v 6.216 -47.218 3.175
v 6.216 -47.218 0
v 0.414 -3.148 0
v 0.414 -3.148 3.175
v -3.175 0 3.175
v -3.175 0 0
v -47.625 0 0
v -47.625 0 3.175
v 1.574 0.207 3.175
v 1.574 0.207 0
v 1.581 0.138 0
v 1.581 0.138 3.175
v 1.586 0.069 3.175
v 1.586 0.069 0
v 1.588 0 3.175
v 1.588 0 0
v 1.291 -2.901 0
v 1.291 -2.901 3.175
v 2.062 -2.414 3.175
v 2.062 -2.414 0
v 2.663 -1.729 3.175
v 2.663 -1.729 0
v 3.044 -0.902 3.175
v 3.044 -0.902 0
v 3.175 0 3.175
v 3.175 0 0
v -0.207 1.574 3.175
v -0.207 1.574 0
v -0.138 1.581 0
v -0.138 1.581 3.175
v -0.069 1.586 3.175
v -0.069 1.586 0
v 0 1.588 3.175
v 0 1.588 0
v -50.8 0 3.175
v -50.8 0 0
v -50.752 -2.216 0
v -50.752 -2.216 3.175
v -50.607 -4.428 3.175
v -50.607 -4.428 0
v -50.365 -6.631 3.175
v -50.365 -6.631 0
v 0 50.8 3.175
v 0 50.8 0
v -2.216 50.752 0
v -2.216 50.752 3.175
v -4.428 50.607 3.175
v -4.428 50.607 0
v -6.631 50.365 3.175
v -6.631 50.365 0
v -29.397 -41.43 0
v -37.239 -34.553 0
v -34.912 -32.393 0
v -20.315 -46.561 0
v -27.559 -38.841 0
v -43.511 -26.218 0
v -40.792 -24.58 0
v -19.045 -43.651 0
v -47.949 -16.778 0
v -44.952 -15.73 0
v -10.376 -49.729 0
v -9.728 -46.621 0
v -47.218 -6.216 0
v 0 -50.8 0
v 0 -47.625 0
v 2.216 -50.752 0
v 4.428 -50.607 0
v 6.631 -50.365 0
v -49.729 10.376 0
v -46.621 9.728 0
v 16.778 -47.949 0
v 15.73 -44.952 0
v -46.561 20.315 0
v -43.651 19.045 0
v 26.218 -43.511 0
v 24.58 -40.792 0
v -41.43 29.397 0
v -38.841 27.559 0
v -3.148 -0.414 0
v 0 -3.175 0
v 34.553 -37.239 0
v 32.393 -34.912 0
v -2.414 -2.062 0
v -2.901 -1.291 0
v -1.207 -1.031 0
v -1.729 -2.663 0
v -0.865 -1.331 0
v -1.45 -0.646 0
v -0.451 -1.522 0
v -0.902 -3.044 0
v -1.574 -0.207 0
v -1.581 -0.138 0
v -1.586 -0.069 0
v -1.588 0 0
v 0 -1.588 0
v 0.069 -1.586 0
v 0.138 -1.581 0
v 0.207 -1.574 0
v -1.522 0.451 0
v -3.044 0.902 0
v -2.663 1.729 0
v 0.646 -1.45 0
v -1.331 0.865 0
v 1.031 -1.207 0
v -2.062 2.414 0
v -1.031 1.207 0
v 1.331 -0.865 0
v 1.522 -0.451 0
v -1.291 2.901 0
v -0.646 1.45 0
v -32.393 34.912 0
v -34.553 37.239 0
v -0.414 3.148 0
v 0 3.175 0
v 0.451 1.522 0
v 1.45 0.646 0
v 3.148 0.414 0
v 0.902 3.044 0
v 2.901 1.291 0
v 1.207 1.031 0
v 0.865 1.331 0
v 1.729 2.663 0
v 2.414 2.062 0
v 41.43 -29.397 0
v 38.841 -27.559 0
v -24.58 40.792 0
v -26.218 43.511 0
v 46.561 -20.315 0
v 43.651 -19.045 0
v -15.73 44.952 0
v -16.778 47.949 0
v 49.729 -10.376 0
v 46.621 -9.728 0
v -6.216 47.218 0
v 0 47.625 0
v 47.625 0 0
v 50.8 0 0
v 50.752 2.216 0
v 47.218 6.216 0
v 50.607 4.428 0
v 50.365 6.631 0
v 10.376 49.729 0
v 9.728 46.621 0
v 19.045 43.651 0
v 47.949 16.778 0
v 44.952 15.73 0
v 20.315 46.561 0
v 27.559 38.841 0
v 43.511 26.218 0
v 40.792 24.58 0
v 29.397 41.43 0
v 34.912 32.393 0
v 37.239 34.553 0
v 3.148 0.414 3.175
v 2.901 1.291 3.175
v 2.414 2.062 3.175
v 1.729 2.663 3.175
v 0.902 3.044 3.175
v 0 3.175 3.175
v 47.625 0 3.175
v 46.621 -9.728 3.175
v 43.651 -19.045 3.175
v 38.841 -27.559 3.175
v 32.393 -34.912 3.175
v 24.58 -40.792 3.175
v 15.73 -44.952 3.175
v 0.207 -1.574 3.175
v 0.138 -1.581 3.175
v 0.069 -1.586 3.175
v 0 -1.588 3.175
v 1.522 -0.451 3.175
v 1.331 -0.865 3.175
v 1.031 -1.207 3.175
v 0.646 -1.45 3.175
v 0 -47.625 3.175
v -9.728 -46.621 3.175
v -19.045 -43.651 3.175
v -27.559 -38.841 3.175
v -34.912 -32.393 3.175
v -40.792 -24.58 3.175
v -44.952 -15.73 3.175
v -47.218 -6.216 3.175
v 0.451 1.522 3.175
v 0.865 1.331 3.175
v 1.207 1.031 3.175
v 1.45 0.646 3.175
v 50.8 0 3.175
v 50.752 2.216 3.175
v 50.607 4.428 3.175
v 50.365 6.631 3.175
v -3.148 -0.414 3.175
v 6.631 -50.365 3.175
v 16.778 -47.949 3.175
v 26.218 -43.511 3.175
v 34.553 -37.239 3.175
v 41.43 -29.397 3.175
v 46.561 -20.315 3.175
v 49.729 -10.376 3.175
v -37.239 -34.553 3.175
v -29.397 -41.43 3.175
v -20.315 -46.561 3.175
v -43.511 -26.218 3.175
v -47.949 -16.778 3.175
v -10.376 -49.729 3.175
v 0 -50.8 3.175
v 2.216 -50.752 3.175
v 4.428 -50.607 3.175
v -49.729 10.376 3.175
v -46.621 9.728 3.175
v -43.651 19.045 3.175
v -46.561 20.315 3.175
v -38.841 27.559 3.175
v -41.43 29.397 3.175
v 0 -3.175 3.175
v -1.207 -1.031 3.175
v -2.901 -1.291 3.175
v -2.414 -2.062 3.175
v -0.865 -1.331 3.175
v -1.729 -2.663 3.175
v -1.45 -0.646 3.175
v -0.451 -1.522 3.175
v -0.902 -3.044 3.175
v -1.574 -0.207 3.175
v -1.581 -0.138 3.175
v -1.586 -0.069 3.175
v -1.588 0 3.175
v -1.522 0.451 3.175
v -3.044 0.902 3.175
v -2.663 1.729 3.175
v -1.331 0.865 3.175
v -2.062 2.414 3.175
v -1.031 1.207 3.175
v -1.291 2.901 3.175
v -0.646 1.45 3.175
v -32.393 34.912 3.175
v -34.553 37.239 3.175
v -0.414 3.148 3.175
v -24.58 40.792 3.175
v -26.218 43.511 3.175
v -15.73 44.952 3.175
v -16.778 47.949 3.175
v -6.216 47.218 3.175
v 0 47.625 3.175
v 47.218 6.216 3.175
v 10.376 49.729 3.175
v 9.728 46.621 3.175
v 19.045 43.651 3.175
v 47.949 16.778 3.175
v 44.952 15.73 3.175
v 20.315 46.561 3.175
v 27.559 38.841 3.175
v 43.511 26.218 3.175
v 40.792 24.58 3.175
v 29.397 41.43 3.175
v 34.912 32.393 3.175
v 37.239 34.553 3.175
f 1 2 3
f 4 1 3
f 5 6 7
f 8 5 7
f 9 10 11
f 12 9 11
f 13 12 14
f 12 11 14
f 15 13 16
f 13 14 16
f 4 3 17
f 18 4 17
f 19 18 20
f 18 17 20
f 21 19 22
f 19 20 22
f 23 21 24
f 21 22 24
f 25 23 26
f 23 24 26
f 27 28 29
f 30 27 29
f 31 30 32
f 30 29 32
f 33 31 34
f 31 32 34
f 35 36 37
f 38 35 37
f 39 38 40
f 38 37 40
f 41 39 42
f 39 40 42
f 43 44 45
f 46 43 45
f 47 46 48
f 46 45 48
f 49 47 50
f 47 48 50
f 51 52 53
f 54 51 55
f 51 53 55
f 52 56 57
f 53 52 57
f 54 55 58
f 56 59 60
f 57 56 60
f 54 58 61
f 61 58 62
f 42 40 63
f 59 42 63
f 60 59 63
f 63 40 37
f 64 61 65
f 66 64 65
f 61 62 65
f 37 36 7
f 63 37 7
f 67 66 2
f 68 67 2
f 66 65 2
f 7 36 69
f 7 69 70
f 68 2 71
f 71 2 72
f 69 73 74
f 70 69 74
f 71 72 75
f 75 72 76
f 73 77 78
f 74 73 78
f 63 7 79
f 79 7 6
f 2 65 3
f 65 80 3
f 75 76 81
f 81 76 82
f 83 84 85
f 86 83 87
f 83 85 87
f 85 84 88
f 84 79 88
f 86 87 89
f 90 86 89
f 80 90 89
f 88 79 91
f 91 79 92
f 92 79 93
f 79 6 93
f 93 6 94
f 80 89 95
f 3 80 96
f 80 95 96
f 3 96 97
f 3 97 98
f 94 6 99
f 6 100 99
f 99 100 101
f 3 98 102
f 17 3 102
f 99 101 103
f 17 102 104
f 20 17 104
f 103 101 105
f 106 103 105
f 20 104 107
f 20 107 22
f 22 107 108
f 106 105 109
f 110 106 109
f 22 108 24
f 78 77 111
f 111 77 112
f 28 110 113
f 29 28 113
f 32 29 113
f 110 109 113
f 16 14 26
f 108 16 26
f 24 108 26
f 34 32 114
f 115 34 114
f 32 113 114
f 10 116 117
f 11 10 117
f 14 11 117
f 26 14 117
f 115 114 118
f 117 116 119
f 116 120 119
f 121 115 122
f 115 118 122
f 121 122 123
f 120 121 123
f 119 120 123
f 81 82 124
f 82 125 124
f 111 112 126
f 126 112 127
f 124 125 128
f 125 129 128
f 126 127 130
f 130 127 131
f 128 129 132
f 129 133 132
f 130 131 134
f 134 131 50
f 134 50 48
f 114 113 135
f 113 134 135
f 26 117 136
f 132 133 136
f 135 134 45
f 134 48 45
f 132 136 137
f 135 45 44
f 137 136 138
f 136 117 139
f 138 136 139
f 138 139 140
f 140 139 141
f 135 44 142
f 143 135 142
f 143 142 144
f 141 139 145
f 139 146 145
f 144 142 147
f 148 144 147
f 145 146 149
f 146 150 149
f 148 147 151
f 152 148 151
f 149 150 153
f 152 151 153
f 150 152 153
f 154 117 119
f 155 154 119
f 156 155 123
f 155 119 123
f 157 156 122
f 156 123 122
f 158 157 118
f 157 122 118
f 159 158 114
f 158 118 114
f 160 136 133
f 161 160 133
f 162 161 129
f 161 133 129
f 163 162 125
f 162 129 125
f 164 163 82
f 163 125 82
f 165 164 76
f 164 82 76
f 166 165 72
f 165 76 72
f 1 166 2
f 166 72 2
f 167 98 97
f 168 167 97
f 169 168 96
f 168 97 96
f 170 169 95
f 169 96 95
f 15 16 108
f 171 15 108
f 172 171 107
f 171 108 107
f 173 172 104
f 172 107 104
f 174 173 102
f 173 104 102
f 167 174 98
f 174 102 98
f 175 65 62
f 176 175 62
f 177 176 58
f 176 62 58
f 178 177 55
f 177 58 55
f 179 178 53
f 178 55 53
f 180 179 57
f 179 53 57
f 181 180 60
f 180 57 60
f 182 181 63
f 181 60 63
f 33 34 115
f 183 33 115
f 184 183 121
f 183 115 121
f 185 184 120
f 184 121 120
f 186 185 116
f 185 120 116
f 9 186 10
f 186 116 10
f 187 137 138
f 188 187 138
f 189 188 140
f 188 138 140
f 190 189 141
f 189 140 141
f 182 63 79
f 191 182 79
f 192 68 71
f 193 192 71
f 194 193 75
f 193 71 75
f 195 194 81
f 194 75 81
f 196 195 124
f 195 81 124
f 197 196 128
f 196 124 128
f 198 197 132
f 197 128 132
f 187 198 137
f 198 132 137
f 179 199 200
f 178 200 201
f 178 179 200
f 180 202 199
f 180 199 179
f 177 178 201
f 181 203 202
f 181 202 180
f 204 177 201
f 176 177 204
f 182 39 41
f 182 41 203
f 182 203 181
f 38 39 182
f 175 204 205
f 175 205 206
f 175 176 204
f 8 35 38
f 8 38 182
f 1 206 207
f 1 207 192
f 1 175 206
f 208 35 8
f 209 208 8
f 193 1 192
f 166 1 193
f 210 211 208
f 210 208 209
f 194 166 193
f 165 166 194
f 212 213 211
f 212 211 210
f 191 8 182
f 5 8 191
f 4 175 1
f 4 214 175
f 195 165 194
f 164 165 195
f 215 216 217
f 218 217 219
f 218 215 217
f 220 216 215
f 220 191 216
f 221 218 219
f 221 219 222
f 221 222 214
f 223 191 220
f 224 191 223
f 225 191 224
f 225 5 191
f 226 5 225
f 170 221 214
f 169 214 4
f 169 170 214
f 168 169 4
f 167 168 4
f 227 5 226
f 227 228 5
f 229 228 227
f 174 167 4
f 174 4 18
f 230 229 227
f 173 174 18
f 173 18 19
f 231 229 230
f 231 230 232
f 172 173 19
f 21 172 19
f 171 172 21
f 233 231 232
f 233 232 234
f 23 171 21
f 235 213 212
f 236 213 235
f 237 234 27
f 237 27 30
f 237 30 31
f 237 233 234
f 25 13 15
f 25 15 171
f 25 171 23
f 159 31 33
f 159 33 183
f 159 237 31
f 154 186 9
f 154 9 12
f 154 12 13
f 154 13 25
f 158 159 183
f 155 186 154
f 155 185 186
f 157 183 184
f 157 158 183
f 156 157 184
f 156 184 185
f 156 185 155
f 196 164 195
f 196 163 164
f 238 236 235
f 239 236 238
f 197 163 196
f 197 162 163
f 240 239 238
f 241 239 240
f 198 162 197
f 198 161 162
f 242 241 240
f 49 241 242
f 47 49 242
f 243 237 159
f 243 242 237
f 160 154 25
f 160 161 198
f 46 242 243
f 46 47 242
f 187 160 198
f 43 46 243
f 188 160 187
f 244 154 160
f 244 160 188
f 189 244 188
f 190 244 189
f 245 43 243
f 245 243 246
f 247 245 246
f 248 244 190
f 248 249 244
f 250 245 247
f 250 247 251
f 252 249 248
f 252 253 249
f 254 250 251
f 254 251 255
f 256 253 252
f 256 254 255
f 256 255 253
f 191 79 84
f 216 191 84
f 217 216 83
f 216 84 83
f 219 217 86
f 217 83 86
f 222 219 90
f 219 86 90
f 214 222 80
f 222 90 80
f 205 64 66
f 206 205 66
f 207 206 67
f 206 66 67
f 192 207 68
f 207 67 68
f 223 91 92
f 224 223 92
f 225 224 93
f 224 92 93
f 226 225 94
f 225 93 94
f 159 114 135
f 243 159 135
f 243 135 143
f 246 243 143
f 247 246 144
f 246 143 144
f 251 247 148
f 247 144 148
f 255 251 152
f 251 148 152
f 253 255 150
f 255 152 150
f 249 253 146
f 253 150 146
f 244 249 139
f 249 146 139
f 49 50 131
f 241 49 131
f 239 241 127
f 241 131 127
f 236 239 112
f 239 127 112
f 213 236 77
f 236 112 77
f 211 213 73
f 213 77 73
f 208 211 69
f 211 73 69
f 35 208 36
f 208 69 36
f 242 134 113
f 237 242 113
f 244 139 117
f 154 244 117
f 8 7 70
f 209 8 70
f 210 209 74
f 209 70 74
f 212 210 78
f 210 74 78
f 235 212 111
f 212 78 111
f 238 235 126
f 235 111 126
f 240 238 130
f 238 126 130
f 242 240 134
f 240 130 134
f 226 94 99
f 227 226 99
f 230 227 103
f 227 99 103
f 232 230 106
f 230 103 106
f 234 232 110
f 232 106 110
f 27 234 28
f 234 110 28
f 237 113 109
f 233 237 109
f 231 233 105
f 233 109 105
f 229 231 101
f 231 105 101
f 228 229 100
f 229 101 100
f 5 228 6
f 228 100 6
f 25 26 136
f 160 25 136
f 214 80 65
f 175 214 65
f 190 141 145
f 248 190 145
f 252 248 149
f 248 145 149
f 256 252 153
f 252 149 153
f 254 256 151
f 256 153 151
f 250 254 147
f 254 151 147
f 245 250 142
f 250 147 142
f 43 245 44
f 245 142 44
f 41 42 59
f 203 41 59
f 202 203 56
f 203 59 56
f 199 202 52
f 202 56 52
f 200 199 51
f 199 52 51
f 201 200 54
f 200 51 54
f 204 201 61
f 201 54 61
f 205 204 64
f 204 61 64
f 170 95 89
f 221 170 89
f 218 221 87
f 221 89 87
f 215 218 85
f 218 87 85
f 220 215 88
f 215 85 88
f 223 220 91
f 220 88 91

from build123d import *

# Parameters (mm, degrees)
F1_DEPTH = 3.175


with BuildPart() as f1:
    # F0 (on Top) → F1 (new body)
    with BuildSketch(Plane.XY):
        with BuildLine():
            Line((-50.8, 0), (-47.625, 0))
            ThreePointArc((-47.625, 0), (-35.8063708312, 31.4013444441), (-6.2163099045, 47.2175615229))
            Line((-6.2163099045, 47.2175615229), (-6.6307305648, 50.3653989578))
            ThreePointArc((-6.6307305648, 50.3653989578), (-38.1934622199, 33.4947674071), (-50.8, 0))
        make_face()
        with BuildLine():
            ThreePointArc((-47.2175615229, -6.2163099045), (-47.5230312192, -3.1148240296), (-47.625, 0))
            Line((-47.625, 0), (-50.8, 0))
            ThreePointArc((-50.8, 0), (-50.6912333005, -3.3224789649), (-50.3653989578, -6.6307305648))
            Line((-50.3653989578, -6.6307305648), (-47.2175615229, -6.2163099045))
        make_face()
        with BuildLine():
            Line((0, -50.8), (0, -47.625))
            ThreePointArc((0, -47.625), (-31.4013444441, -35.8063708312), (-47.2175615229, -6.2163099045))
            Line((-47.2175615229, -6.2163099045), (-50.3653989578, -6.6307305648))
            ThreePointArc((-50.3653989578, -6.6307305648), (-33.4947674071, -38.1934622199), (0, -50.8))
        make_face()
        with BuildLine():
            Line((50.8, 0), (47.625, 0))
            ThreePointArc((47.625, 0), (35.8063708312, -31.4013444441), (6.2163099045, -47.2175615229))
            Line((6.2163099045, -47.2175615229), (6.6307305648, -50.3653989578))
            ThreePointArc((6.6307305648, -50.3653989578), (38.1934622199, -33.4947674071), (50.8, 0))
        make_face()
        with BuildLine():
            ThreePointArc((0, 47.625), (31.4013444441, 35.8063708312), (47.2175615229, 6.2163099045))
            Line((47.2175615229, 6.2163099045), (50.3653989578, 6.6307305648))
            ThreePointArc((50.3653989578, 6.6307305648), (33.4947674071, 38.1934622199), (0, 50.8))
            Line((0, 50.8), (0, 47.625))
        make_face()
        with BuildLine():
            ThreePointArc((-6.2163099045, 47.2175615229), (-3.1148240296, 47.5230312192), (0, 47.625))
            Line((0, 47.625), (0, 50.8))
            ThreePointArc((0, 50.8), (-3.3224789649, 50.6912333005), (-6.6307305648, 50.3653989578))
            Line((-6.6307305648, 50.3653989578), (-6.2163099045, 47.2175615229))
        make_face()
        with BuildLine():
            ThreePointArc((47.2175615229, 6.2163099045), (47.5230312192, 3.1148240296), (47.625, 0))
            Line((47.625, 0), (50.8, 0))
            ThreePointArc((50.8, 0), (50.6912333005, 3.3224789649), (50.3653989578, 6.6307305648))
            Line((50.3653989578, 6.6307305648), (47.2175615229, 6.2163099045))
        make_face()
        with BuildLine():
            Line((6.6307305648, -50.3653989578), (6.2163099045, -47.2175615229))
            ThreePointArc((6.2163099045, -47.2175615229), (3.1148240296, -47.5230312192), (0, -47.625))
            Line((0, -47.625), (0, -50.8))
            ThreePointArc((0, -50.8), (3.3224789649, -50.6912333005), (6.6307305648, -50.3653989578))
        make_face()
        with BuildLine():
            Line((-3.175, 0), (-1.5875, 0))
            ThreePointArc((-1.5875, 0), (-1.1935456944, 1.0467114815), (-0.2072103301, 1.5739187174))
            Line((-0.2072103301, 1.5739187174), (-0.4144206603, 3.1478374349))
            ThreePointArc((-0.4144206603, 3.1478374349), (-2.3870913887, 2.0934229629), (-3.175, 0))
        make_face()
        with BuildLine():
            ThreePointArc((-1.5739187174, -0.2072103301), (-1.5841010406, -0.1038274677), (-1.5875, 0))
            Line((-1.5875, 0), (-3.175, 0))
            ThreePointArc((-3.175, 0), (-3.1682020813, -0.2076549353), (-3.1478374349, -0.4144206603))
            Line((-3.1478374349, -0.4144206603), (-1.5739187174, -0.2072103301))
        make_face()
        with BuildLine():
            Line((0, -3.175), (0, -1.5875))
            ThreePointArc((0, -1.5875), (-1.0467114815, -1.1935456944), (-1.5739187174, -0.2072103301))
            Line((-1.5739187174, -0.2072103301), (-3.1478374349, -0.4144206603))
            ThreePointArc((-3.1478374349, -0.4144206603), (-2.0934229629, -2.3870913887), (0, -3.175))
        make_face()
        with BuildLine():
            Line((0.4144206603, -3.1478374349), (0.2072103301, -1.5739187174))
            ThreePointArc((0.2072103301, -1.5739187174), (0.1038274677, -1.5841010406), (0, -1.5875))
            Line((0, -1.5875), (0, -3.175))
            ThreePointArc((0, -3.175), (0.2076549353, -3.1682020813), (0.4144206603, -3.1478374349))
        make_face()
        with BuildLine():
            Line((3.175, 0), (1.5875, 0))
            ThreePointArc((1.5875, 0), (1.1935456944, -1.0467114815), (0.2072103301, -1.5739187174))
            Line((0.2072103301, -1.5739187174), (0.4144206603, -3.1478374349))
            ThreePointArc((0.4144206603, -3.1478374349), (2.3870913887, -2.0934229629), (3.175, 0))
        make_face()
        with BuildLine():
            ThreePointArc((1.5739187174, 0.2072103301), (1.5841010406, 0.1038274677), (1.5875, 0))
            Line((1.5875, 0), (3.175, 0))
            ThreePointArc((3.175, 0), (3.1682020813, 0.2076549353), (3.1478374349, 0.4144206603))
            Line((3.1478374349, 0.4144206603), (1.5739187174, 0.2072103301))
        make_face()
        with BuildLine():
            ThreePointArc((0, 1.5875), (1.0467114815, 1.1935456944), (1.5739187174, 0.2072103301))
            Line((1.5739187174, 0.2072103301), (3.1478374349, 0.4144206603))
            ThreePointArc((3.1478374349, 0.4144206603), (2.0934229629, 2.3870913887), (0, 3.175))
            Line((0, 3.175), (0, 1.5875))
        make_face()
        with BuildLine():
            ThreePointArc((-0.2072103301, 1.5739187174), (-0.1038274677, 1.5841010406), (0, 1.5875))
            Line((0, 1.5875), (0, 3.175))
            ThreePointArc((0, 3.175), (-0.2076549353, 3.1682020813), (-0.4144206603, 3.1478374349))
            Line((-0.4144206603, 3.1478374349), (-0.2072103301, 1.5739187174))
        make_face()
        with BuildLine():
            ThreePointArc((-0.4144206603, 3.1478374349), (-0.2076549353, 3.1682020813), (0, 3.175))
            Line((0, 3.175), (0, 47.625))
            ThreePointArc((0, 47.625), (-3.1148240296, 47.5230312192), (-6.2163099045, 47.2175615229))
            Line((-6.2163099045, 47.2175615229), (-0.4144206603, 3.1478374349))
        make_face()
        with BuildLine():
            ThreePointArc((-3.1478374349, -0.4144206603), (-3.1682020813, -0.2076549353), (-3.175, 0))
            Line((-3.175, 0), (-47.625, 0))
            ThreePointArc((-47.625, 0), (-47.5230312192, -3.1148240296), (-47.2175615229, -6.2163099045))
            Line((-47.2175615229, -6.2163099045), (-3.1478374349, -0.4144206603))
        make_face()
        with BuildLine():
            Line((6.2163099045, -47.2175615229), (0.4144206603, -3.1478374349))
            ThreePointArc((0.4144206603, -3.1478374349), (0.2076549353, -3.1682020813), (0, -3.175))
            Line((0, -3.175), (0, -47.625))
            ThreePointArc((0, -47.625), (3.1148240296, -47.5230312192), (6.2163099045, -47.2175615229))
        make_face()
        with BuildLine():
            ThreePointArc((3.1478374349, 0.4144206603), (3.1682020813, 0.2076549353), (3.175, 0))
            Line((3.175, 0), (47.625, 0))
            ThreePointArc((47.625, 0), (47.5230312192, 3.1148240296), (47.2175615229, 6.2163099045))
            Line((47.2175615229, 6.2163099045), (3.1478374349, 0.4144206603))
        make_face()
    extrude(amount=F1_DEPTH)


solid = f1.part
